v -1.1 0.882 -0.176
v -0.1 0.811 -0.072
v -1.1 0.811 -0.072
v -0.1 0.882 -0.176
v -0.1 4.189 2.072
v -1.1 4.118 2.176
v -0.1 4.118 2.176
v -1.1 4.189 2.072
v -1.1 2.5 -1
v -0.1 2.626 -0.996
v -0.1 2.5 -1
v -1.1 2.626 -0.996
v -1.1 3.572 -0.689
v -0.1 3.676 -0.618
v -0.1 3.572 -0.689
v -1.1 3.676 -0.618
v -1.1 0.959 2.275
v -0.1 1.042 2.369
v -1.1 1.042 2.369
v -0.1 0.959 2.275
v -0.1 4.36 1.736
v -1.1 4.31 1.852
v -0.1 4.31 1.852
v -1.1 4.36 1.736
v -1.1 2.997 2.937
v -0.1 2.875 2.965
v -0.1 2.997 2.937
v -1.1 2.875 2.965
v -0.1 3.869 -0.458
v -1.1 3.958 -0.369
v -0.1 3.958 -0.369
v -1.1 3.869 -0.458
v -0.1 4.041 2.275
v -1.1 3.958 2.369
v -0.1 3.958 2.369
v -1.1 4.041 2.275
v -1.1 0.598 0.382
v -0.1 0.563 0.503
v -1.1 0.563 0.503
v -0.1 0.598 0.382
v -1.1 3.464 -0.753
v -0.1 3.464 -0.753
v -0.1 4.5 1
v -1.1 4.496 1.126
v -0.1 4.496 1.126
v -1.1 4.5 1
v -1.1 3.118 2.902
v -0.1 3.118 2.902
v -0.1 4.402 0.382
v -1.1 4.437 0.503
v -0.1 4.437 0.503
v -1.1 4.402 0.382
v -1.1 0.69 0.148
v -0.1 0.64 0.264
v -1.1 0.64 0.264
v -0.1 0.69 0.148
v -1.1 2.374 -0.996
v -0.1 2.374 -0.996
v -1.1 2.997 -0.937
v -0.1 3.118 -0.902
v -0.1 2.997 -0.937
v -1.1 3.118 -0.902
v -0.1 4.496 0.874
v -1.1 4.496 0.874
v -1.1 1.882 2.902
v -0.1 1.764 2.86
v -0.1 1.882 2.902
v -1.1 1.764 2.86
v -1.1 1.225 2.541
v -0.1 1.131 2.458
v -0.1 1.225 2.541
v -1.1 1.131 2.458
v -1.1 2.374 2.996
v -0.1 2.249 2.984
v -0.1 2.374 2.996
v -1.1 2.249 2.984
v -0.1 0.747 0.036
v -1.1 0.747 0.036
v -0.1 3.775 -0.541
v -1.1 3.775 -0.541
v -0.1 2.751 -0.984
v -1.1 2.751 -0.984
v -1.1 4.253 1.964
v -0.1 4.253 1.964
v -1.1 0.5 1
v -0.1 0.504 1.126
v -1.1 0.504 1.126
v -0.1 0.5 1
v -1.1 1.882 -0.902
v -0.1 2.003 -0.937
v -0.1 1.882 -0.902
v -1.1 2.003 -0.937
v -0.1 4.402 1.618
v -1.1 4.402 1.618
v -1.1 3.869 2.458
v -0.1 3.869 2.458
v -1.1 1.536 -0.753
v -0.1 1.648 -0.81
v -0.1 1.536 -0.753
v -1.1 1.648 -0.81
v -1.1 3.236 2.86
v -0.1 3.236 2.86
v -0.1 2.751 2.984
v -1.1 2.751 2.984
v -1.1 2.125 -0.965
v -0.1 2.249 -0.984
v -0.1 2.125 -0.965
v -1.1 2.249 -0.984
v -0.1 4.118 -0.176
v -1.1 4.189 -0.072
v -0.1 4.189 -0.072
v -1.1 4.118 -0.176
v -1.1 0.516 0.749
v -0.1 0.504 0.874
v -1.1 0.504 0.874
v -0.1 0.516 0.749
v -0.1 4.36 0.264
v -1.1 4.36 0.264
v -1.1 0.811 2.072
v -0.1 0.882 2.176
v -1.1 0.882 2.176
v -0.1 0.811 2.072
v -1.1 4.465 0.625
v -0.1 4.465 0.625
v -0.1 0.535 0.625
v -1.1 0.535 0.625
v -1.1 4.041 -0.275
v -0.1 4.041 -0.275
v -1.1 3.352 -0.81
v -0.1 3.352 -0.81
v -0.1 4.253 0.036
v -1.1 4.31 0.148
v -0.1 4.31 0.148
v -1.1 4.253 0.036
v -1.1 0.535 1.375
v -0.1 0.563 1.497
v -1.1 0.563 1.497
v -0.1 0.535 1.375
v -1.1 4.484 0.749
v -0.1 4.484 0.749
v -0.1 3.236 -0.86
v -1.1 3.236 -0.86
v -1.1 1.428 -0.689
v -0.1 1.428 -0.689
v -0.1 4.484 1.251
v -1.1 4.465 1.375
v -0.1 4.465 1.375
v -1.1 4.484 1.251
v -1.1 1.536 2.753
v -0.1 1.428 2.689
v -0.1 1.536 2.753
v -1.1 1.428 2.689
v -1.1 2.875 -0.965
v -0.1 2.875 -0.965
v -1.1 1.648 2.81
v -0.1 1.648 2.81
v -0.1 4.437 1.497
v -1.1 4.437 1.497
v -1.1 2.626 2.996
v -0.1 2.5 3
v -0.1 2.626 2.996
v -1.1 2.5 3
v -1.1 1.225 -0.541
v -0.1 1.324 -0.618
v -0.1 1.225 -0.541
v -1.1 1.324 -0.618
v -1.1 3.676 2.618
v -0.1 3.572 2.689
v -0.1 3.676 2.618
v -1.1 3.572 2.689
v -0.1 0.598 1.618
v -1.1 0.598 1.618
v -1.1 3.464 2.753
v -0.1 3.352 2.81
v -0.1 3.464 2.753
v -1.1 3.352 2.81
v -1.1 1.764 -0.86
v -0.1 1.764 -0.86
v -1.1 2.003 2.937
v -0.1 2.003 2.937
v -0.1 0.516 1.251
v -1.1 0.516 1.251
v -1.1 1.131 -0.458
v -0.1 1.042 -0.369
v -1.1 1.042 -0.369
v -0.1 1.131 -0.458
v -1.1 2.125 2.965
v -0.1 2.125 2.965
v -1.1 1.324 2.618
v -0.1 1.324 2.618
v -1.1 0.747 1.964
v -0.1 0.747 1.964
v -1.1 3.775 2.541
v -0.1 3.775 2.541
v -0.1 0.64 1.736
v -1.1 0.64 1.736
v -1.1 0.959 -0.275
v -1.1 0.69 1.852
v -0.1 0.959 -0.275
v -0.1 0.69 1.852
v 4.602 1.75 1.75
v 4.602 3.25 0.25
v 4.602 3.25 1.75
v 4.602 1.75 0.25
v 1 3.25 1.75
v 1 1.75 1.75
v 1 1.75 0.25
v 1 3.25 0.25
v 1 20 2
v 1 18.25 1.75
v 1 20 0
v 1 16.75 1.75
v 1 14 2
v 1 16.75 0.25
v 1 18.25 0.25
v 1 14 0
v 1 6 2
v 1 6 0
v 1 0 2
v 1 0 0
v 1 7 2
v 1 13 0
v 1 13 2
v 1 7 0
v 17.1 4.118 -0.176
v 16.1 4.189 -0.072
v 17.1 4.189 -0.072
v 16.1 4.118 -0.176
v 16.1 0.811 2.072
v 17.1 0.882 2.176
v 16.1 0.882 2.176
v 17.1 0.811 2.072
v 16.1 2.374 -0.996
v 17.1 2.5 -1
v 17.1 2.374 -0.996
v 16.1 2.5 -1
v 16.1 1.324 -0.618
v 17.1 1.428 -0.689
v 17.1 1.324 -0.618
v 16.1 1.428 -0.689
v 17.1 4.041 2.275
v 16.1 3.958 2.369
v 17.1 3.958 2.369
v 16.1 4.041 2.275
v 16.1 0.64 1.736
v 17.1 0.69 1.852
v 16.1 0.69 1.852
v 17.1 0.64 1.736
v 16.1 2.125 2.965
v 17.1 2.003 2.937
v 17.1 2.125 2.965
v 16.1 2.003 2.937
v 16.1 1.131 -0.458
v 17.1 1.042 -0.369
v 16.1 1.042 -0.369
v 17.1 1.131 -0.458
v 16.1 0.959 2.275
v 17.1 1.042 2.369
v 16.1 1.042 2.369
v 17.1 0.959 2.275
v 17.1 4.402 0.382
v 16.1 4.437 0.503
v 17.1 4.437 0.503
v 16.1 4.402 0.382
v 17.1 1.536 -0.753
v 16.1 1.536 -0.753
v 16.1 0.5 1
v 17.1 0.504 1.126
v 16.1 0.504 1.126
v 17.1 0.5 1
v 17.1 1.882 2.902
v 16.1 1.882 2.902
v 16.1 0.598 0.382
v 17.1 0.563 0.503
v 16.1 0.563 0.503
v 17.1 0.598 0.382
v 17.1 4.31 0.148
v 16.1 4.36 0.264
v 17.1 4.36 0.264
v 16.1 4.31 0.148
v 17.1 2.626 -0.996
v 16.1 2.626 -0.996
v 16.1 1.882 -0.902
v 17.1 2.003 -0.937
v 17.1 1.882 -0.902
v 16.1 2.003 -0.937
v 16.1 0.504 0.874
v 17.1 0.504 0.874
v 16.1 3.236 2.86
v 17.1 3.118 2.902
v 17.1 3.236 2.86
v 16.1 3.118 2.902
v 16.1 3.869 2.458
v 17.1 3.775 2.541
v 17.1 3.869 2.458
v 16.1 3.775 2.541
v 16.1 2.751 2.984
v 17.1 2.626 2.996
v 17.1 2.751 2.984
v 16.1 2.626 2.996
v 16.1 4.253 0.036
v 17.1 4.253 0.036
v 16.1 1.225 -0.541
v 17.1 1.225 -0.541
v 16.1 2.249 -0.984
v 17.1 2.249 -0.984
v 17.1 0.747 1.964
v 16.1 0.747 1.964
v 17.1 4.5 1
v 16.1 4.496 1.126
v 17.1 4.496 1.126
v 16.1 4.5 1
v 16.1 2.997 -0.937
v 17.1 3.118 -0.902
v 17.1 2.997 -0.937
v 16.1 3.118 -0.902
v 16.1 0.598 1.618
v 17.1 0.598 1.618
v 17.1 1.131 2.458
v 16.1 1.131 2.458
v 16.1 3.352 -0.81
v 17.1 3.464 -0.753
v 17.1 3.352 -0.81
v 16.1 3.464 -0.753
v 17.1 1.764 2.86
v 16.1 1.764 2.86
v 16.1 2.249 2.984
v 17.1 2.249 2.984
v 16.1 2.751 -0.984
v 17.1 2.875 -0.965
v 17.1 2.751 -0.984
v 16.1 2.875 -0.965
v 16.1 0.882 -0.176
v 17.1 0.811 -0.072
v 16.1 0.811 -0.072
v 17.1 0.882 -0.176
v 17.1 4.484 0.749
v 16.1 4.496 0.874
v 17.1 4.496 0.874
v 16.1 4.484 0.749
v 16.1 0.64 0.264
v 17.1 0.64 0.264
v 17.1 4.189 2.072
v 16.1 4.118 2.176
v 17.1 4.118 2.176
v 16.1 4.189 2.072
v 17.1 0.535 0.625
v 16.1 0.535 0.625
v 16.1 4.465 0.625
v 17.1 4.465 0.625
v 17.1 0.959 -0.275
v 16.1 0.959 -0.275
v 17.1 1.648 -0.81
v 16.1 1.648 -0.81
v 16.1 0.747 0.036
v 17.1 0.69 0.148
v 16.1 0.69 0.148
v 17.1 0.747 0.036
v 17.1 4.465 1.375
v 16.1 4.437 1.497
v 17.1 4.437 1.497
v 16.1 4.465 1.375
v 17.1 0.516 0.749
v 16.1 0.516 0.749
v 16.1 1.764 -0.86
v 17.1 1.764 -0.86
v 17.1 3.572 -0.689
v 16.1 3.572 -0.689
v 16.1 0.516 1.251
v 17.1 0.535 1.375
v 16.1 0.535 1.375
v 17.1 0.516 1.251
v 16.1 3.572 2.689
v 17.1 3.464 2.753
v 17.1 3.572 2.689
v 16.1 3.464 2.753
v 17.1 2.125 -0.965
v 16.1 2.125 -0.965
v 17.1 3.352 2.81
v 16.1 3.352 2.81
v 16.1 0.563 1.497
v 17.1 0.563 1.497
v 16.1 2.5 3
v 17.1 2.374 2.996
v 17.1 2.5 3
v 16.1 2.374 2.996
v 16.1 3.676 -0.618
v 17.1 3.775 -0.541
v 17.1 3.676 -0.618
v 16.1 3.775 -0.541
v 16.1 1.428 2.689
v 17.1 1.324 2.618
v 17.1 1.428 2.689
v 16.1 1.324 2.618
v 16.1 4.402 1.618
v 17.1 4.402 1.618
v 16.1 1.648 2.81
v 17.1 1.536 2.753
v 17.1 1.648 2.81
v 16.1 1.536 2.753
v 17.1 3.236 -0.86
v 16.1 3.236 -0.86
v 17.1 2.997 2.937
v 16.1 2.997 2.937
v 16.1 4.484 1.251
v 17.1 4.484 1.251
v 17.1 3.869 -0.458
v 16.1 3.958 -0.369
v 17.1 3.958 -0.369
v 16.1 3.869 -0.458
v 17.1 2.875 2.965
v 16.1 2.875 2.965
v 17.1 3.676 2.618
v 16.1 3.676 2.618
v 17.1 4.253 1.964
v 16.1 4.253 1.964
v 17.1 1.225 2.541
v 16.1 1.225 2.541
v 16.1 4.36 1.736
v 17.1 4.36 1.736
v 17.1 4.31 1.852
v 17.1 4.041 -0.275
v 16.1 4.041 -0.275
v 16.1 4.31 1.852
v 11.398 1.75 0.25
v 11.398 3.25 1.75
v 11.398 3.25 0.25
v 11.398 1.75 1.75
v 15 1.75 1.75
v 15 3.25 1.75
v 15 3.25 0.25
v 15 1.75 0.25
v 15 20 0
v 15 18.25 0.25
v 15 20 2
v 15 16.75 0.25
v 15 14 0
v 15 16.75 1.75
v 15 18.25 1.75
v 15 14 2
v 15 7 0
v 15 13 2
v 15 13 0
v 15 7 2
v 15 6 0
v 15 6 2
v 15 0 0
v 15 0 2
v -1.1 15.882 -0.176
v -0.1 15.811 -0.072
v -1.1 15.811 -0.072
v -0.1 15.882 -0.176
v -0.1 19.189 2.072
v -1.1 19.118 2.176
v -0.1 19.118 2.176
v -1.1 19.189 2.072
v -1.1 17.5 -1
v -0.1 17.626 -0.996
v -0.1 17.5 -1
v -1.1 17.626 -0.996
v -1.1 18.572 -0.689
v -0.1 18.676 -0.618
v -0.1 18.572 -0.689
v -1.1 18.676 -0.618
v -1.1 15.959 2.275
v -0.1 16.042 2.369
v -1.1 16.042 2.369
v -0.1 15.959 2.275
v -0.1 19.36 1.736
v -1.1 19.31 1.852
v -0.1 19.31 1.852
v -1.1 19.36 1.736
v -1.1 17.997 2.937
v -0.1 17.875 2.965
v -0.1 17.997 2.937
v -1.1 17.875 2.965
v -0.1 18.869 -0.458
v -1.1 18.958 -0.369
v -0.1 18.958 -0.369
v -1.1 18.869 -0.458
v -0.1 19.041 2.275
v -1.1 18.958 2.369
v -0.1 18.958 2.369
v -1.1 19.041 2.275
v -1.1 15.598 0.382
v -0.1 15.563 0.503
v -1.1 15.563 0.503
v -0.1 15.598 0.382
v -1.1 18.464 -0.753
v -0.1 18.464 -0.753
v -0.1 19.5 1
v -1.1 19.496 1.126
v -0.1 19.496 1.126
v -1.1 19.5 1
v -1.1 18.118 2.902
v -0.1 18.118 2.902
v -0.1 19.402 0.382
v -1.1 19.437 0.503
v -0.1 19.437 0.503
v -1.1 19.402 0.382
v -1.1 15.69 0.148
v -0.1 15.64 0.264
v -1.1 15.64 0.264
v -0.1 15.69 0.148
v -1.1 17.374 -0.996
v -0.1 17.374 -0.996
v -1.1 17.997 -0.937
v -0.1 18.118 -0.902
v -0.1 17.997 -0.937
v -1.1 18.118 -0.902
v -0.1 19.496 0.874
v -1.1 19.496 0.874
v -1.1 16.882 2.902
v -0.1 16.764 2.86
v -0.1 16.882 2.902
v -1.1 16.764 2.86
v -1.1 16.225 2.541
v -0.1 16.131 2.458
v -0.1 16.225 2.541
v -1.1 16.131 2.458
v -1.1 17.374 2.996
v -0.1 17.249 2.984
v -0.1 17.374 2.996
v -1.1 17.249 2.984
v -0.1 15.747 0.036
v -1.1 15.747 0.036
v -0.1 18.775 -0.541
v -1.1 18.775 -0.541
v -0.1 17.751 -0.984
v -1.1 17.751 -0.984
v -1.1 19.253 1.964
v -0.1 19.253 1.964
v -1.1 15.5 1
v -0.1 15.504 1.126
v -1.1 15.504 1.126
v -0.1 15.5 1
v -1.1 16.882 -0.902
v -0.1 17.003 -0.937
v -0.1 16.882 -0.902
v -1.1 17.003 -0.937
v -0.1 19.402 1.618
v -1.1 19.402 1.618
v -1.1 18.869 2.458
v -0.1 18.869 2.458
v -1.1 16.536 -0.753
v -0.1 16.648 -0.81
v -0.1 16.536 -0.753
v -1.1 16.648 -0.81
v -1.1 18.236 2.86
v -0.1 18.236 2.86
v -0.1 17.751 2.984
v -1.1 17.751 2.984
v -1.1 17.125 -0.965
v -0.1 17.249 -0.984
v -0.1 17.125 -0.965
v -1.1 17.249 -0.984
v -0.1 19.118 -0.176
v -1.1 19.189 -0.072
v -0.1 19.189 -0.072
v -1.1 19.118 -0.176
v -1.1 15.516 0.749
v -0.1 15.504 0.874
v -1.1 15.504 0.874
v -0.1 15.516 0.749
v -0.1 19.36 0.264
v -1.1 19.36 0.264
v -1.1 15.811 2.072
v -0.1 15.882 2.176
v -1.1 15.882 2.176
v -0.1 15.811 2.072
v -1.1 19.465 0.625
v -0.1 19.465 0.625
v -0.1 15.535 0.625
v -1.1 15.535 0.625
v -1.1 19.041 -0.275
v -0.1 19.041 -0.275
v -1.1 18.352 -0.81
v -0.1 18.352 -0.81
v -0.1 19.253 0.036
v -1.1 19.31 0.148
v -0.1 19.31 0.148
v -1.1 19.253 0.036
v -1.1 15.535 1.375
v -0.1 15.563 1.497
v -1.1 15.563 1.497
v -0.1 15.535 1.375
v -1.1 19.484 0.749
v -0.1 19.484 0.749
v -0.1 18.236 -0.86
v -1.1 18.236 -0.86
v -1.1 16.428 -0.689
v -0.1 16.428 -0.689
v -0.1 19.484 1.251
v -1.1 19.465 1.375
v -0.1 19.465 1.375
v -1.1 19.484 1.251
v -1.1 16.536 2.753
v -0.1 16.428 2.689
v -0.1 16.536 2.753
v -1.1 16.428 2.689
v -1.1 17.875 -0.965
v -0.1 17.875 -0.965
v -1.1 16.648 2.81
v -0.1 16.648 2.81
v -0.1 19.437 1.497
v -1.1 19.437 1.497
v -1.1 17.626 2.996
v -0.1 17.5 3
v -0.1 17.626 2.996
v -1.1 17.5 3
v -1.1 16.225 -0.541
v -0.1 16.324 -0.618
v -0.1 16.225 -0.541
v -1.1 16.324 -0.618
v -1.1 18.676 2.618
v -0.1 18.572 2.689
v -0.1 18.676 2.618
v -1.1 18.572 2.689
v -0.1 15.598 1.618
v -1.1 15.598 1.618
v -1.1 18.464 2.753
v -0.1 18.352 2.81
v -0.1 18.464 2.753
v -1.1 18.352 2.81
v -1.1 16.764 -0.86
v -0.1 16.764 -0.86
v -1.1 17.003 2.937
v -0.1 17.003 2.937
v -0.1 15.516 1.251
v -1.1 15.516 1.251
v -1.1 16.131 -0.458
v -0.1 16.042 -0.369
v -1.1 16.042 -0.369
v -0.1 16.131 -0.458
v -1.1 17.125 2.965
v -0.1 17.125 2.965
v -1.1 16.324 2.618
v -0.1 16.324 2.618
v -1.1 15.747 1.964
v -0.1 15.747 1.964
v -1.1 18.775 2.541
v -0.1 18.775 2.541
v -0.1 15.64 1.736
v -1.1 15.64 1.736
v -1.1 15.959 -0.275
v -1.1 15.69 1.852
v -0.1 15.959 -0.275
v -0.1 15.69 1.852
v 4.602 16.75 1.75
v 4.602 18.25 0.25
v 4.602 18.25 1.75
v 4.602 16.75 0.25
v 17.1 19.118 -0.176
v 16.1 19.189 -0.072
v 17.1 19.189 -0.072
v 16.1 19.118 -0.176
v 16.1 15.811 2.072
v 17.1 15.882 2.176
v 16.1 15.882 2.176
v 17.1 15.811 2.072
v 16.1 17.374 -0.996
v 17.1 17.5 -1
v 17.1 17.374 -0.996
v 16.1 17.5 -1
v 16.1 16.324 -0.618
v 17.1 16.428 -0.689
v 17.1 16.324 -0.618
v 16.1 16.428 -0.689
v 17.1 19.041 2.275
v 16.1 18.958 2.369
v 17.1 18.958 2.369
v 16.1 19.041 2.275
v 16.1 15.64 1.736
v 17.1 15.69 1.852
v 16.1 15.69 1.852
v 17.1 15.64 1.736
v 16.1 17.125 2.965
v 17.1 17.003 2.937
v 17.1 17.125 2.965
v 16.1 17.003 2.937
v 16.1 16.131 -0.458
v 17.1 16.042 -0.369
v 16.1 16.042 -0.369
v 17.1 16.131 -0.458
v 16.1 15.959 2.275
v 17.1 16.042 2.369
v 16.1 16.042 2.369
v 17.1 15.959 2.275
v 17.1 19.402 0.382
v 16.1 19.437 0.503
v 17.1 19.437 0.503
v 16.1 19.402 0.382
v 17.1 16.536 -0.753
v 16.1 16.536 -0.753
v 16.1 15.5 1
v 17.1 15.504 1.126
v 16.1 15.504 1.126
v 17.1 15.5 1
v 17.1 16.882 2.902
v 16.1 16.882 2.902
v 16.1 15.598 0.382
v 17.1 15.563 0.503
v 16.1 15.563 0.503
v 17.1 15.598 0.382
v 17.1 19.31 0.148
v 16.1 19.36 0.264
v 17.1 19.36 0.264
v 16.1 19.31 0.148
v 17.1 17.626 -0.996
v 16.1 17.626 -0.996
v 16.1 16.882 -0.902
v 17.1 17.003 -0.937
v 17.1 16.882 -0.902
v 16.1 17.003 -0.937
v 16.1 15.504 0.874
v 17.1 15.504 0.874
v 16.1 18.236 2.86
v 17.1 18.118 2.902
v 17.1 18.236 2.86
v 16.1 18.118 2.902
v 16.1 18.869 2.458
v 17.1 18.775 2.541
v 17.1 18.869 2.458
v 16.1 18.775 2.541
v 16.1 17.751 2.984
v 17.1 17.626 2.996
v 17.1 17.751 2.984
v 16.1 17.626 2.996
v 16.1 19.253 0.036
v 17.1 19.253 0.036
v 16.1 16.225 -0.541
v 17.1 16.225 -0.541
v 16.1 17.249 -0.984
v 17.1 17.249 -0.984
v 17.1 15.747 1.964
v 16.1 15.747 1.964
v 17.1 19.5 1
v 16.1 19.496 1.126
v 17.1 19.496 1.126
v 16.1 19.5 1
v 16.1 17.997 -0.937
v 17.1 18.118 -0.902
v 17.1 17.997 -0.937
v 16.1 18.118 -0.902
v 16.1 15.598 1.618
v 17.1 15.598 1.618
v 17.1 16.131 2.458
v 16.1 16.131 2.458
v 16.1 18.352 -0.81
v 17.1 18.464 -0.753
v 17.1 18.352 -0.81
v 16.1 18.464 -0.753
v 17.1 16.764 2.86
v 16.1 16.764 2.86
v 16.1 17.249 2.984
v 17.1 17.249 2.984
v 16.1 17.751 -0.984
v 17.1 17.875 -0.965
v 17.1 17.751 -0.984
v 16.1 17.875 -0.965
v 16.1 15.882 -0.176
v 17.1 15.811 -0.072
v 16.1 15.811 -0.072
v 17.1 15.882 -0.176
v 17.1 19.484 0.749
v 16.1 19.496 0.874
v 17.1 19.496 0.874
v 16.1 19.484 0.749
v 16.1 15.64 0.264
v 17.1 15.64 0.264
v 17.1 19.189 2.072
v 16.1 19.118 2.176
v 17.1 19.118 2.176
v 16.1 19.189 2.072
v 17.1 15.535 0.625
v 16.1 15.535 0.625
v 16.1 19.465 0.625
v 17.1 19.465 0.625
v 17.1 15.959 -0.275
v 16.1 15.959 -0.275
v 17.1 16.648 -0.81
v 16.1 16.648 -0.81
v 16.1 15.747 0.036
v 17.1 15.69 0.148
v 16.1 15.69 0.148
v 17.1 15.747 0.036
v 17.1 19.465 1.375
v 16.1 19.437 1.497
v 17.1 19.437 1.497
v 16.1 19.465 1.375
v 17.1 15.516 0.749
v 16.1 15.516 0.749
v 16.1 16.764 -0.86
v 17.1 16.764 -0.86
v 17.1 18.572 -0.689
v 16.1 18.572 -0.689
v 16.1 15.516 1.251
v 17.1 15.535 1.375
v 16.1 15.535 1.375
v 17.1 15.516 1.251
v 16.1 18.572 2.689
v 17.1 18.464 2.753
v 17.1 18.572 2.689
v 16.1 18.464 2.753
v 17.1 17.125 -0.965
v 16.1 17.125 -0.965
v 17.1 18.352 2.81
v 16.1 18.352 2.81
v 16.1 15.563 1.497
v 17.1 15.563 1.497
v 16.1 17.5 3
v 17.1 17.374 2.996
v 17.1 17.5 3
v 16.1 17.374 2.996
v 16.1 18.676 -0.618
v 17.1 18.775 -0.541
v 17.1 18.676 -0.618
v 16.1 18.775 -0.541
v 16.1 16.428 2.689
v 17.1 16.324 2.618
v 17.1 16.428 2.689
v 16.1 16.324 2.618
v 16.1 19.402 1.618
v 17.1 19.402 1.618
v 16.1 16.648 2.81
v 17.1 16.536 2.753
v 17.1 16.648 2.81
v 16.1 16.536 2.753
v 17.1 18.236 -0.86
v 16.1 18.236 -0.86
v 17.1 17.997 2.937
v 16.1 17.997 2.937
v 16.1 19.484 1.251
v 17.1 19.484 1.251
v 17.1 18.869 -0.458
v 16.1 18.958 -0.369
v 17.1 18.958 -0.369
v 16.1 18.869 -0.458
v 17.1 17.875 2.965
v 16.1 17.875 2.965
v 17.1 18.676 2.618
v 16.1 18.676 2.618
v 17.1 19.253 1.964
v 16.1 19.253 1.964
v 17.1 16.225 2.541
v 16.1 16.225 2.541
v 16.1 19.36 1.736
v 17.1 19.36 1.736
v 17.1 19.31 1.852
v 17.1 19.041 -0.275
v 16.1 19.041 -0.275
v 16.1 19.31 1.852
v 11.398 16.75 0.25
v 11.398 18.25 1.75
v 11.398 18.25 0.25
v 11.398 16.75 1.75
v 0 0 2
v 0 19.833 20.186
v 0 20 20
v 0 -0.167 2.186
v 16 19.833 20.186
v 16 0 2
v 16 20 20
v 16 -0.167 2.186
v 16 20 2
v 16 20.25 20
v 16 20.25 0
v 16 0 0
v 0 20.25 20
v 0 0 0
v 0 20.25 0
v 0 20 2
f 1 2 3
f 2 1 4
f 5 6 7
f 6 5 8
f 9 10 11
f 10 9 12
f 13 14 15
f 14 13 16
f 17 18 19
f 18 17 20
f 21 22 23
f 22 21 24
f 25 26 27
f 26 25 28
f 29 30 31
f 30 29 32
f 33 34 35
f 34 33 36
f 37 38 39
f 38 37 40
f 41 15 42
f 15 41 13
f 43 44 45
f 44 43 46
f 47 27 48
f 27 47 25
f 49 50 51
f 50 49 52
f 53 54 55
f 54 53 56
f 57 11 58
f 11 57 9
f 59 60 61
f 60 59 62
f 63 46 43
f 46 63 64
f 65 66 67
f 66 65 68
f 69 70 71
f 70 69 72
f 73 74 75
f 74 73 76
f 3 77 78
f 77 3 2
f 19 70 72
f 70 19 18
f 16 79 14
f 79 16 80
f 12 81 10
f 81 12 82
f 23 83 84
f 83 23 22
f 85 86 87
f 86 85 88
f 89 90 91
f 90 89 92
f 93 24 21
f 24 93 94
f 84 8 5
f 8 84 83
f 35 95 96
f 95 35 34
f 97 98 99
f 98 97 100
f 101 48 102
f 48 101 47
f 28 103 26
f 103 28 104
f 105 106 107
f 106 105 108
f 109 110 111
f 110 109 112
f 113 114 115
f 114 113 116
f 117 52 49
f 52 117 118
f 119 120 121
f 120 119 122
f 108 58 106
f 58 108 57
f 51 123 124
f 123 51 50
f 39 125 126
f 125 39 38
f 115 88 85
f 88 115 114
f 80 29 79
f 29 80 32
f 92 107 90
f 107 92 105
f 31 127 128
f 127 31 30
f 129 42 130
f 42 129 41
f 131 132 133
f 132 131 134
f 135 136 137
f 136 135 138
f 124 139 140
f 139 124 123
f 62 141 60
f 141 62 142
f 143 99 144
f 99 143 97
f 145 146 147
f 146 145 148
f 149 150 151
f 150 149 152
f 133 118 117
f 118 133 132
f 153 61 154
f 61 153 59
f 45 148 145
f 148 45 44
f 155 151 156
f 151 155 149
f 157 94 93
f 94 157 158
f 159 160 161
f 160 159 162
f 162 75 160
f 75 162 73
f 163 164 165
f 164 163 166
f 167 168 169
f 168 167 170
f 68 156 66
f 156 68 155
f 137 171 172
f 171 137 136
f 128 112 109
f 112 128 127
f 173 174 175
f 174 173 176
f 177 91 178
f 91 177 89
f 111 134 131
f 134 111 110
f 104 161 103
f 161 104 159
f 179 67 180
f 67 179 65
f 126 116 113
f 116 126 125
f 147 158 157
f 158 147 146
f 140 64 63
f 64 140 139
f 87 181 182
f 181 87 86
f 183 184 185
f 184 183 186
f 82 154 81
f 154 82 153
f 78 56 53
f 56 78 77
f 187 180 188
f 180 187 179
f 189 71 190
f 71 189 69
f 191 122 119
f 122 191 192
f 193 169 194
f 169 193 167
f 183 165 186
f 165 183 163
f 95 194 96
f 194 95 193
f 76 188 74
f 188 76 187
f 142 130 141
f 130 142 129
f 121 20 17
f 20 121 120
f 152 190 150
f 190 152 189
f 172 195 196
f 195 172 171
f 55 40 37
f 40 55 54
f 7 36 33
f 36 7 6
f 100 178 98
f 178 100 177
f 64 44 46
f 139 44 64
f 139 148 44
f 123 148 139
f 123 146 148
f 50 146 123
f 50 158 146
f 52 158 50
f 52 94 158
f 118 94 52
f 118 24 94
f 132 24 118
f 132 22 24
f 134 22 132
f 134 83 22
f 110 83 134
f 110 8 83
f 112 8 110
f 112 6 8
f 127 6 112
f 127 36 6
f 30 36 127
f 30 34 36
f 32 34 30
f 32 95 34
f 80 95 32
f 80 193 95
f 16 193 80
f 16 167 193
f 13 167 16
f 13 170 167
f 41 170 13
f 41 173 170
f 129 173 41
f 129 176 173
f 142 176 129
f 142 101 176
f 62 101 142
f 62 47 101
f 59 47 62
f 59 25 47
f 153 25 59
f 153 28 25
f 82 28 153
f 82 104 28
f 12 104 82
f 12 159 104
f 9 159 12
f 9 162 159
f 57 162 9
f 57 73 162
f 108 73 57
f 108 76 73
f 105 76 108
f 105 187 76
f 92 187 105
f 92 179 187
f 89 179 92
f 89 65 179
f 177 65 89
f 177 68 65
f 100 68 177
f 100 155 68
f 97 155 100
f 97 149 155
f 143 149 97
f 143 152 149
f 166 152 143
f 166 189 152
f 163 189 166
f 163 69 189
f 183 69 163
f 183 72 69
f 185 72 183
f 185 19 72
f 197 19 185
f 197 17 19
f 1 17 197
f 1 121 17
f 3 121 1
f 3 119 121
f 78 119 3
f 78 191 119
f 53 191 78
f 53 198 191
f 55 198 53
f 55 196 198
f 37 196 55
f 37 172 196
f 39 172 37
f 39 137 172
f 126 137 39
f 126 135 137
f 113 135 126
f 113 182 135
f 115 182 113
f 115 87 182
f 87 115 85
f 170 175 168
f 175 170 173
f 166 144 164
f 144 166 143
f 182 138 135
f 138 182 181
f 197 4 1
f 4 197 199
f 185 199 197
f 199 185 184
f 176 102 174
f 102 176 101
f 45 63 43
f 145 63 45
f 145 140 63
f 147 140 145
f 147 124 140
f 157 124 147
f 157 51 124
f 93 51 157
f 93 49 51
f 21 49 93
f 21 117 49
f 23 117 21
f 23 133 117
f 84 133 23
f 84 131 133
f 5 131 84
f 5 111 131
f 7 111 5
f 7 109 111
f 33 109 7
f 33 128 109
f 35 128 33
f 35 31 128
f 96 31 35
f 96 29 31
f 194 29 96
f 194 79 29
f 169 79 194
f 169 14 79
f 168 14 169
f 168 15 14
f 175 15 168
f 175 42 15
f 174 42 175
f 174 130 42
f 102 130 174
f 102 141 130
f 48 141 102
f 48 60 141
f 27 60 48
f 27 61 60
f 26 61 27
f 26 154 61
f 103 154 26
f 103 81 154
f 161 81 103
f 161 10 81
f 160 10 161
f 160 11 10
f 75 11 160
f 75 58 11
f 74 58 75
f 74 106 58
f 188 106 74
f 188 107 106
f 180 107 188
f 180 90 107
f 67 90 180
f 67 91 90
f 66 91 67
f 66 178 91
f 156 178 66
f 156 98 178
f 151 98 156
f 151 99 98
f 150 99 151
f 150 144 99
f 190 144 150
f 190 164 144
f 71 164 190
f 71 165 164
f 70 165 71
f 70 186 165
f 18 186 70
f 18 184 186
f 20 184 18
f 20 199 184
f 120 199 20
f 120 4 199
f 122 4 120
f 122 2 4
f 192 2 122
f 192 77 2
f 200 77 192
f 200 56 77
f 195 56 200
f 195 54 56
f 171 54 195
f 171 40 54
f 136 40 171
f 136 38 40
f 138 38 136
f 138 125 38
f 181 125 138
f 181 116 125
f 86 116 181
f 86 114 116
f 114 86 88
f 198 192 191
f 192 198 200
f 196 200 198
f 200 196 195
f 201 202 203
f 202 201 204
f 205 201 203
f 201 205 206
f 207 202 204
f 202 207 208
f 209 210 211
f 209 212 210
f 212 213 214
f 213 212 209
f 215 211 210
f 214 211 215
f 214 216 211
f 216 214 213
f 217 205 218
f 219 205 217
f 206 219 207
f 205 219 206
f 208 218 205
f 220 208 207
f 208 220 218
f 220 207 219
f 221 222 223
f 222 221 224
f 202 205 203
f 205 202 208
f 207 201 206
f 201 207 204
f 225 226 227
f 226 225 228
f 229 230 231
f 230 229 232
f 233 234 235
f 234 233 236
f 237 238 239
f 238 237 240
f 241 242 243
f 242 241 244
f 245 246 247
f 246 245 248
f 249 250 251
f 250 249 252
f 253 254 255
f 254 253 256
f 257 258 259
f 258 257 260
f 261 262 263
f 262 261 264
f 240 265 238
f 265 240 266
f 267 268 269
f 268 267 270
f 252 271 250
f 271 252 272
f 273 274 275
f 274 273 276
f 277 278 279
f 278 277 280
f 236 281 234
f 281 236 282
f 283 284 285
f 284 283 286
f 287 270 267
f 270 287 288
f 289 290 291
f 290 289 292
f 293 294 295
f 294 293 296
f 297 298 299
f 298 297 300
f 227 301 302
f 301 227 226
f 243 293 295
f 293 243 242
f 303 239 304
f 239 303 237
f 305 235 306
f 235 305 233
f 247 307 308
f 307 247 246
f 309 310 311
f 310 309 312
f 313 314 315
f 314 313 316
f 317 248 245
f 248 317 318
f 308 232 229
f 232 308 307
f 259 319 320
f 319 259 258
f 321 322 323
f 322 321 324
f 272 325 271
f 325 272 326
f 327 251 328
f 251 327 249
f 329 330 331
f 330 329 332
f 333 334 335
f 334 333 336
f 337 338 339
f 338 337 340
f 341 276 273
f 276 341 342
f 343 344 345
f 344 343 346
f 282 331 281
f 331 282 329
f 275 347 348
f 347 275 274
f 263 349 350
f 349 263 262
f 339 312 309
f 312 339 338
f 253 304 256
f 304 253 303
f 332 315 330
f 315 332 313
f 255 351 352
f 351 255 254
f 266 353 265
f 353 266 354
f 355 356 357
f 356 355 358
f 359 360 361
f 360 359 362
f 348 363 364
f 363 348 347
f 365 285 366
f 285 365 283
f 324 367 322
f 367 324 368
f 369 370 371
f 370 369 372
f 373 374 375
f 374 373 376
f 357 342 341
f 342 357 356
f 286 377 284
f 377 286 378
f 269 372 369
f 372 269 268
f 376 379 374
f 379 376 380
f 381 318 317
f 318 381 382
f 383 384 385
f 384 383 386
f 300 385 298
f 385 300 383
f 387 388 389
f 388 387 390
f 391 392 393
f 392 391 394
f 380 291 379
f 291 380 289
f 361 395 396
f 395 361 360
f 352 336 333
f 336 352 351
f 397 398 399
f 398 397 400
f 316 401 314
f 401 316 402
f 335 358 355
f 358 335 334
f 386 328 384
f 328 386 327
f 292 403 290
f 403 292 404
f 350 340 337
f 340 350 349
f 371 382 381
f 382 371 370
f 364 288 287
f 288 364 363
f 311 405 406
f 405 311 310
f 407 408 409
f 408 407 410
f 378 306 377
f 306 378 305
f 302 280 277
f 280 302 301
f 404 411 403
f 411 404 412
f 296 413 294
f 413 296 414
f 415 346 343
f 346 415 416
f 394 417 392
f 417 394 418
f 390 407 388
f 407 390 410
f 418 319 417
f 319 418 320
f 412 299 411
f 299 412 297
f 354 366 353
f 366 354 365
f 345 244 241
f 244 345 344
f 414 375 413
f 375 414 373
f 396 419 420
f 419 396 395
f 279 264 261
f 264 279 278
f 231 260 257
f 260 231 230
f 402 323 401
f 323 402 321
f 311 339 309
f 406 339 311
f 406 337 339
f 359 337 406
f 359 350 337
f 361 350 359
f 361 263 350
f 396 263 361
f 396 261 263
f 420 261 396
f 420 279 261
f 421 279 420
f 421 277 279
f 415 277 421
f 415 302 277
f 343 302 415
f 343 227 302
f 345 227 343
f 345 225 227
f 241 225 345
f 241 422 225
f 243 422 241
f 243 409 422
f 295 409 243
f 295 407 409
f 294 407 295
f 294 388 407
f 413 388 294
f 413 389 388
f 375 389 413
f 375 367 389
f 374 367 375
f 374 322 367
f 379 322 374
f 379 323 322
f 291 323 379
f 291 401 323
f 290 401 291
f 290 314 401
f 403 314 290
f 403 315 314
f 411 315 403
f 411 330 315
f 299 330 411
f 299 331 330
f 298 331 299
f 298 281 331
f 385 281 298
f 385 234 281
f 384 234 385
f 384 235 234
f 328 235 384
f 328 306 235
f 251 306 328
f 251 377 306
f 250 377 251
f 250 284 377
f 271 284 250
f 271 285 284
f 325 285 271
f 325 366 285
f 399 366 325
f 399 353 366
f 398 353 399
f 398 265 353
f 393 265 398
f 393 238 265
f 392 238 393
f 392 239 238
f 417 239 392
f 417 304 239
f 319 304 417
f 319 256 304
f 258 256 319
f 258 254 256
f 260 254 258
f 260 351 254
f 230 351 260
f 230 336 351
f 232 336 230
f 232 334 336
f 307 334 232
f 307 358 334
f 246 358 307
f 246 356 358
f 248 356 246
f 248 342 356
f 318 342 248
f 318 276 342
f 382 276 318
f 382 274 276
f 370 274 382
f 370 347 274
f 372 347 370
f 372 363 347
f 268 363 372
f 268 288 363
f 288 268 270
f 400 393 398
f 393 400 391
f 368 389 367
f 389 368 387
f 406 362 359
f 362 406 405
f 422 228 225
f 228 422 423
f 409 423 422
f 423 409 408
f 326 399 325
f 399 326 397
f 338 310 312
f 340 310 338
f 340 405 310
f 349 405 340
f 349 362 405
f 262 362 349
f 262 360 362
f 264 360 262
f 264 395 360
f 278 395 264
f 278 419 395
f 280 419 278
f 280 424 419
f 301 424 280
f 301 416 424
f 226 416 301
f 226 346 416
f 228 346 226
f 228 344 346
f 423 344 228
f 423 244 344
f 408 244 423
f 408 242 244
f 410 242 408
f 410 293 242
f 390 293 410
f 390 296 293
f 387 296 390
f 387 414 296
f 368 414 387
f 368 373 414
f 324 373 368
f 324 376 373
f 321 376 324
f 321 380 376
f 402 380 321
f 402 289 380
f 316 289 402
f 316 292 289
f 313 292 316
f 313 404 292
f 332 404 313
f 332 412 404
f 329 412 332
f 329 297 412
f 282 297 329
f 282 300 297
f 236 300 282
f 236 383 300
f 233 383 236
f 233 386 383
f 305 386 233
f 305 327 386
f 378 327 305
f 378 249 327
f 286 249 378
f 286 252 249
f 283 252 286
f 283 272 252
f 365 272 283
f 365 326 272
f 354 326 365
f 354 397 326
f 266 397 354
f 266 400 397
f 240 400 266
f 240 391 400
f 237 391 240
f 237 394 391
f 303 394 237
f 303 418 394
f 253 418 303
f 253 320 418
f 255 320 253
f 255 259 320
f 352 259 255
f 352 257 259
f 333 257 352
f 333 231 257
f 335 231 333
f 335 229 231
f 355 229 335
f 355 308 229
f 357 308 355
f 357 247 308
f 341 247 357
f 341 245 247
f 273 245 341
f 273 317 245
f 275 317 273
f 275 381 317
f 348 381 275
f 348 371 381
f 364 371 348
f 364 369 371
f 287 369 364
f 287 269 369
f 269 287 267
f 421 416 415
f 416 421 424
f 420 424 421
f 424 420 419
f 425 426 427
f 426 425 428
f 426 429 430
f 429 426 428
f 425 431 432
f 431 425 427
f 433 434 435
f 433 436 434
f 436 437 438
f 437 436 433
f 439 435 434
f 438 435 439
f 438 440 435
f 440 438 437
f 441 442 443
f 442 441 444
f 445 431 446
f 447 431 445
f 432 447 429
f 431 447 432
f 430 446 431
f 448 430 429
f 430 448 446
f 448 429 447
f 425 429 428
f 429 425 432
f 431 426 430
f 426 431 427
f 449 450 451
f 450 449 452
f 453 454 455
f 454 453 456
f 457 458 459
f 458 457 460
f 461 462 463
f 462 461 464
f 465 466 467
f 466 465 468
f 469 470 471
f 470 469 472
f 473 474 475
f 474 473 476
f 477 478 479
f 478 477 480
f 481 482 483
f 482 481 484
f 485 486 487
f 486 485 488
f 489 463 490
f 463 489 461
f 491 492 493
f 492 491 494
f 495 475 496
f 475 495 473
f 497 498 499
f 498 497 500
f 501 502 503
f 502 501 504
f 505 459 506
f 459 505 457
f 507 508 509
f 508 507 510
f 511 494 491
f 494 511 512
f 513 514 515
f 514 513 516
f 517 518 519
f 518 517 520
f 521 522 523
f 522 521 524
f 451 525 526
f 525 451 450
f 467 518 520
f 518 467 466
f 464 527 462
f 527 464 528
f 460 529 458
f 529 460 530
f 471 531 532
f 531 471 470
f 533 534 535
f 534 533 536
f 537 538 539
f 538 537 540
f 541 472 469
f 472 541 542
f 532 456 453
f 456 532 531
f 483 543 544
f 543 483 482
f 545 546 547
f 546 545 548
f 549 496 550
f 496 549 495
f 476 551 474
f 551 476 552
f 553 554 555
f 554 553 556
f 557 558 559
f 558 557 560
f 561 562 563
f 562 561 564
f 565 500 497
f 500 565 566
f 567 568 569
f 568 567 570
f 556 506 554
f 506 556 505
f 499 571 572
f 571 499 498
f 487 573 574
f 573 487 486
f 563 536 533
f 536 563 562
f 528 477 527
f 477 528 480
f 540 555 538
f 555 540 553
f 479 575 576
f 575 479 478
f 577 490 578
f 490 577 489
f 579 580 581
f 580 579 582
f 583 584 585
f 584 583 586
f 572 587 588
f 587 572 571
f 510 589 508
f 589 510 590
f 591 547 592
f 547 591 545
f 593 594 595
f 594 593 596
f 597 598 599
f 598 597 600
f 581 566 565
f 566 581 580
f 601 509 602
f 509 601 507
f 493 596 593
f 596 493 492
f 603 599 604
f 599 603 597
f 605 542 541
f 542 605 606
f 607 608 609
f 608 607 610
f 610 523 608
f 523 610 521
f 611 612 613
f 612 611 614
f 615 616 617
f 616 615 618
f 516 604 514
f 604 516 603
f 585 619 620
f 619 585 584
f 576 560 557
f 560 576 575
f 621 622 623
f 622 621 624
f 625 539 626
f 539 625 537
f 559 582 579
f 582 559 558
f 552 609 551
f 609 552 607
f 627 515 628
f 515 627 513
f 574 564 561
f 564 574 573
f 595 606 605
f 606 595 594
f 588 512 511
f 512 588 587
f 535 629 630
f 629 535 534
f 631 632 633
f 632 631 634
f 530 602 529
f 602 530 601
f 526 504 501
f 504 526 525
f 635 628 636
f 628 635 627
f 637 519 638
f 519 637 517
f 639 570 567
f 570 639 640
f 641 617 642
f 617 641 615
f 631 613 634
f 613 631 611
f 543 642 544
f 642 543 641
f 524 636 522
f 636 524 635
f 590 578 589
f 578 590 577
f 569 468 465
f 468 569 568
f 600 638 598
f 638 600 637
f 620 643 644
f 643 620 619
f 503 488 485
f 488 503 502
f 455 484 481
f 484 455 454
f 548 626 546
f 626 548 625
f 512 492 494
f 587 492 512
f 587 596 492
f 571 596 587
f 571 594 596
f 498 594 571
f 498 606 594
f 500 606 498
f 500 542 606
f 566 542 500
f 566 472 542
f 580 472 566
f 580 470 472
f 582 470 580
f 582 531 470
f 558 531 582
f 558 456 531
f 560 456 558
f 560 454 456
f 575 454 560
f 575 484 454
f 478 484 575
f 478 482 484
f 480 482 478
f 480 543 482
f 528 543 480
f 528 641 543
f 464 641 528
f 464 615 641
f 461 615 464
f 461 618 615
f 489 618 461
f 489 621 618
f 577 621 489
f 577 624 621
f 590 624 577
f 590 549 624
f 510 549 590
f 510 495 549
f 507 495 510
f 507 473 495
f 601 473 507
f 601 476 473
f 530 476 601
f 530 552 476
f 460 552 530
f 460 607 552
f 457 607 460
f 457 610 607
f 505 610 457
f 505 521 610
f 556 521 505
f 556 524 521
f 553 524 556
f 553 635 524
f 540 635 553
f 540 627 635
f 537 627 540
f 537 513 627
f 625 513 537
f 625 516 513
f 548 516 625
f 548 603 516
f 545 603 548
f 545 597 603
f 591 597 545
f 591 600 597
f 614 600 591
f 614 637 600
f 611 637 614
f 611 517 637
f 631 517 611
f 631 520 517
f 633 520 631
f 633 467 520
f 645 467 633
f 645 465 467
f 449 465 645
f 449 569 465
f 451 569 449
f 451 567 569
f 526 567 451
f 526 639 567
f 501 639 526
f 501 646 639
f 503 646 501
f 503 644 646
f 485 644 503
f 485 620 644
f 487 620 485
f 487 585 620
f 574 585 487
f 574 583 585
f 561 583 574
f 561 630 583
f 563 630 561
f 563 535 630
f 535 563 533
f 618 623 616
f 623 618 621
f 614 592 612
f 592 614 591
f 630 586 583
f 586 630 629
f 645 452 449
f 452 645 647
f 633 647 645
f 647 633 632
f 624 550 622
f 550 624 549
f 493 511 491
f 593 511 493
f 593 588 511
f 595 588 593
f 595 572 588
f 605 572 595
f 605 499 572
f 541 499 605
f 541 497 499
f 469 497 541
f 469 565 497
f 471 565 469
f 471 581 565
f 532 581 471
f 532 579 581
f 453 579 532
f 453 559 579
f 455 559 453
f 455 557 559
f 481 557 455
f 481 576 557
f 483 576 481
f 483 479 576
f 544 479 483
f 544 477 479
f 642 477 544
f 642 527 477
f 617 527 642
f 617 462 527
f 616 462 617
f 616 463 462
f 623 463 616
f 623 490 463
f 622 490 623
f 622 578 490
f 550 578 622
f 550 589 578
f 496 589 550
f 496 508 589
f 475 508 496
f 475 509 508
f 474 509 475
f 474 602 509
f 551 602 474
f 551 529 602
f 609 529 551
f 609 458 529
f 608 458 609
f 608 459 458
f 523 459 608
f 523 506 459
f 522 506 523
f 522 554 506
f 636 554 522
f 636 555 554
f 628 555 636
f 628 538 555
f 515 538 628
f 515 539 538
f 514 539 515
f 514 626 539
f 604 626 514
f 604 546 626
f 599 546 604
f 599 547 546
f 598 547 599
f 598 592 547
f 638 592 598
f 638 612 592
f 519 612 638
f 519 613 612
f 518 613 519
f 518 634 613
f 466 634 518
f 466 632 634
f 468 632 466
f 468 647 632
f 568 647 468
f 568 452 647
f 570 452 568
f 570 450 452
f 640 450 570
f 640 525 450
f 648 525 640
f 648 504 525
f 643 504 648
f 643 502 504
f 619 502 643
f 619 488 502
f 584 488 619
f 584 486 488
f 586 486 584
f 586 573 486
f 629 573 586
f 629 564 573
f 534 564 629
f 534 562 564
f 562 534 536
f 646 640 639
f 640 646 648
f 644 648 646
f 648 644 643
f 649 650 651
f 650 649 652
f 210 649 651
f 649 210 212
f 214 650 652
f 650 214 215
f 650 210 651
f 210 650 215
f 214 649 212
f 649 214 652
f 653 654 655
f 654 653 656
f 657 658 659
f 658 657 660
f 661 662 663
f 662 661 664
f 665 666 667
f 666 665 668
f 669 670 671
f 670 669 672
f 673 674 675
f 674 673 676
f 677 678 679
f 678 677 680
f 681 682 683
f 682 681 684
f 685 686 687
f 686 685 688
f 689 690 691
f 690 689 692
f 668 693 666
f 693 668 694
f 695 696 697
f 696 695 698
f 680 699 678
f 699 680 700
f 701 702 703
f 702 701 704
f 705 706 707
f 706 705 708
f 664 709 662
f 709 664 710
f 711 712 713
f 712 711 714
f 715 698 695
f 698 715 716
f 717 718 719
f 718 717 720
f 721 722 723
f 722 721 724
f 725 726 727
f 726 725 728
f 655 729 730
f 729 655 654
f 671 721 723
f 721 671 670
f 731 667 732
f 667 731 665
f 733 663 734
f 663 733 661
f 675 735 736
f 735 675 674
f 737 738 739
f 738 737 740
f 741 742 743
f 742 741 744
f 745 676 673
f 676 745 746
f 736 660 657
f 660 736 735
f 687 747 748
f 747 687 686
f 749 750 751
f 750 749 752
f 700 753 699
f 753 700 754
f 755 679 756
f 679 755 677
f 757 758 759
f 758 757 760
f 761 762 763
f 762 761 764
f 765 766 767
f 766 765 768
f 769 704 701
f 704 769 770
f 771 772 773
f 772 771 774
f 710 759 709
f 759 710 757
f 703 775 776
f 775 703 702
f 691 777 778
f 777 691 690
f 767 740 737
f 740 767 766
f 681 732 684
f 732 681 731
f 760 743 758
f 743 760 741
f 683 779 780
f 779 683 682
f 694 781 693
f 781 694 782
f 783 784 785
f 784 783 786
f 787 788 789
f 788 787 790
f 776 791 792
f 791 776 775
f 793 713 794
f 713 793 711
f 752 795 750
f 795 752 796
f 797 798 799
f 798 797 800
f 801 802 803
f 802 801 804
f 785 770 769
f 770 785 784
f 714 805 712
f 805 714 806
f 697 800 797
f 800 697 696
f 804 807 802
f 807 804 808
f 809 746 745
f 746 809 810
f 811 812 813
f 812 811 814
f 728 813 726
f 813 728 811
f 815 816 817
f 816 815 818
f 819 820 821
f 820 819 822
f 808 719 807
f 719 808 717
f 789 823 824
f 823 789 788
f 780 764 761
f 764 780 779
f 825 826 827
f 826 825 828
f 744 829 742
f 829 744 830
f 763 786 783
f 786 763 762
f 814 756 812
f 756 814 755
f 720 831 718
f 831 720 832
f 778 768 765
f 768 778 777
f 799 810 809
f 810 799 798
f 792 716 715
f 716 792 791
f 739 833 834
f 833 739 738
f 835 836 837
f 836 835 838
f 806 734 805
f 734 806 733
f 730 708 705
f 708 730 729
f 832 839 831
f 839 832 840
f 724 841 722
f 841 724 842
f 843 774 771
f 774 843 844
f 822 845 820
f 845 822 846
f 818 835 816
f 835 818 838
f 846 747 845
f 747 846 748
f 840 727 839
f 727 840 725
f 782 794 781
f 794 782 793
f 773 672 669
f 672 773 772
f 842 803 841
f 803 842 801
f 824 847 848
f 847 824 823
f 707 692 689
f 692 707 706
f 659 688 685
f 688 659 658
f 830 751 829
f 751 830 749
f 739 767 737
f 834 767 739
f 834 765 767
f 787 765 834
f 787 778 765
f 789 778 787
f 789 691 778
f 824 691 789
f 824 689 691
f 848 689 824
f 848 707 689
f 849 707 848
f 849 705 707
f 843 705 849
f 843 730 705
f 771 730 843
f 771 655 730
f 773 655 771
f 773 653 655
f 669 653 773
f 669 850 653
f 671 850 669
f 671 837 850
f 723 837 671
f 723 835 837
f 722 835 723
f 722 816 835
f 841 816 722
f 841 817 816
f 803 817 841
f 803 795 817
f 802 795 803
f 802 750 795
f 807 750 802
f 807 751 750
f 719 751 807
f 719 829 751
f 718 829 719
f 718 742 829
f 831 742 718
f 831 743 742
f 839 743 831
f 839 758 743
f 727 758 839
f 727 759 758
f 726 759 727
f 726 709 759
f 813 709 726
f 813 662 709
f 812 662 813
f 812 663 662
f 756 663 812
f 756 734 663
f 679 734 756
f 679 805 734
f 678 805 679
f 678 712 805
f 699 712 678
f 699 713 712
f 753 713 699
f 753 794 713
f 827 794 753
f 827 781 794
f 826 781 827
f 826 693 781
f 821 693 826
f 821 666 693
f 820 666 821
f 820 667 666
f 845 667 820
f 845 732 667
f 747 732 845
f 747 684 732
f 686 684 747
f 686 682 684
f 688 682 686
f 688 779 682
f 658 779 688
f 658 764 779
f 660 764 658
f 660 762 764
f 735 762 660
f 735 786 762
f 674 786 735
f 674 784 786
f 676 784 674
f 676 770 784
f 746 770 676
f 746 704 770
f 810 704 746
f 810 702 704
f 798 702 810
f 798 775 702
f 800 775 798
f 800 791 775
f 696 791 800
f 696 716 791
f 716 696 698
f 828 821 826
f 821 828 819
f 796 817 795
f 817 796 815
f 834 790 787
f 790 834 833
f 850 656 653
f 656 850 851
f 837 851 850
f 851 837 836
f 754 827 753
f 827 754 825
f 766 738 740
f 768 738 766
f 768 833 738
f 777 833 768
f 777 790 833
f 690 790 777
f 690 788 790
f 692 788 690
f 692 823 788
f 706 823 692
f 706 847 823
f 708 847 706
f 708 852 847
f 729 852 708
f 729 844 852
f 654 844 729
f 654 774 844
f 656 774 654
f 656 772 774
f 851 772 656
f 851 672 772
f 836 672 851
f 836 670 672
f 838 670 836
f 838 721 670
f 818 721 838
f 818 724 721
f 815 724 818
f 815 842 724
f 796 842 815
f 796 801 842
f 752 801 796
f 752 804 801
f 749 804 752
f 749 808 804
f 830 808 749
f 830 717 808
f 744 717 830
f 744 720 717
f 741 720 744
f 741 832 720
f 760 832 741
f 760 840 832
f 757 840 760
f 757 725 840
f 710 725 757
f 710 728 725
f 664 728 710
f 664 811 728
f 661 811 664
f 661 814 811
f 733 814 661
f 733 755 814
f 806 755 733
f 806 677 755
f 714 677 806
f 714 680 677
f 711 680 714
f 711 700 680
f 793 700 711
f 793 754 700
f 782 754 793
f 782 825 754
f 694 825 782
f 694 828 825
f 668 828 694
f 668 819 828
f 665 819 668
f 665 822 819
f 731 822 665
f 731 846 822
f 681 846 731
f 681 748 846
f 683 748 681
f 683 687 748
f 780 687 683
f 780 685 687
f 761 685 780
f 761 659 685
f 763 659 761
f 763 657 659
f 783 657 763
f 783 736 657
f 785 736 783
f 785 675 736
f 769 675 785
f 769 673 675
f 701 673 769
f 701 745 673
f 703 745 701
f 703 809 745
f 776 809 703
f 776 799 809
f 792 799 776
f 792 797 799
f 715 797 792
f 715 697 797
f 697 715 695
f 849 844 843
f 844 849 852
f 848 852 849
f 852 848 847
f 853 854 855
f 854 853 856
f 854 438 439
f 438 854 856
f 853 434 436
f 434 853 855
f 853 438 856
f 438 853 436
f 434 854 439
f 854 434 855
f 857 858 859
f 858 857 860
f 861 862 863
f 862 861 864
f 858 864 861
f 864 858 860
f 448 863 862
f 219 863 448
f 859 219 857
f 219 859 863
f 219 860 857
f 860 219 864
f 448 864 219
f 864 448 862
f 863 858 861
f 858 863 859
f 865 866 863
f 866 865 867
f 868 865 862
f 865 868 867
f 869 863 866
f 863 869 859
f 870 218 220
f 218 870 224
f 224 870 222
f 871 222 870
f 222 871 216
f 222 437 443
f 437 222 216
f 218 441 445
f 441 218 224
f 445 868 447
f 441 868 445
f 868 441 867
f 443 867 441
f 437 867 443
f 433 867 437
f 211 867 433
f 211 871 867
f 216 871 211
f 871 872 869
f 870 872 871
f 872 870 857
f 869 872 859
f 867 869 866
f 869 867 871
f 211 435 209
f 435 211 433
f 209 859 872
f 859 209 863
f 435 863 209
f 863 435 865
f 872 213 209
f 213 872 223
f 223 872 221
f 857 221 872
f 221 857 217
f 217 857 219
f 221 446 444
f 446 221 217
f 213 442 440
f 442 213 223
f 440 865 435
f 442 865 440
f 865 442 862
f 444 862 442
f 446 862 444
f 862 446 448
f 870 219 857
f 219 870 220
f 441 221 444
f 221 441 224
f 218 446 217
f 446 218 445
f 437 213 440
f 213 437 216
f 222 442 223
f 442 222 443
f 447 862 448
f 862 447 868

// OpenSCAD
width = 16;
length = 20;
height = 20;

innerH = 6;

boxWidth = 1;
boxHeight = 2;

// http://www.andymark.com/Banebots-p/am-2876.htm
// https://www.armabot.com/products/rs7-encoder
// or 
boxLength = (2*(width-boxWidth*2) + 2*length);
weight = .1052 * boxLength + 0.5 * 4 + 0.8 *4;


echo(weight);

cube([boxWidth,length,boxHeight]);

translate([boxWidth,innerH]) cube([width-boxWidth*2,boxWidth,boxHeight]);

translate([boxWidth,length-boxWidth-innerH]) cube([width-boxWidth*2,boxWidth,boxHeight]);

translate([width-boxWidth,0]) cube([boxWidth,length,boxHeight]);

wheelInset = 2.5;

module gearMotor() {
    color([0.8,0.8,0.8]) translate([-1.1-boxWidth,0.75,0.75]) rotate([0,90,0]) cylinder(r=2,h=1,$fn=100);
    color([0.8,0.8,0.8]) cube([1+2.602,1.5,1.5]);
}

translate([1,wheelInset-0.75,0.25]) gearMotor();

translate([width-boxWidth,0.75+wheelInset,0.25]) rotate(180) gearMotor();

translate([1,length-0.75-wheelInset,0.25]) gearMotor();

translate([width-boxWidth,length+0.75-wheelInset,0.25]) rotate(180) gearMotor();

rampLength = sqrt(length*length + (height-boxHeight)*(height-boxHeight));

color([0.1,0.1,0.1,0.3]) {
translate([0,0,boxHeight]) rotate([atan((height-boxHeight)/length),0,0]) cube([width,rampLength,0.25]);

translate([0,length,0]) cube([width,0.25,height]);
}
